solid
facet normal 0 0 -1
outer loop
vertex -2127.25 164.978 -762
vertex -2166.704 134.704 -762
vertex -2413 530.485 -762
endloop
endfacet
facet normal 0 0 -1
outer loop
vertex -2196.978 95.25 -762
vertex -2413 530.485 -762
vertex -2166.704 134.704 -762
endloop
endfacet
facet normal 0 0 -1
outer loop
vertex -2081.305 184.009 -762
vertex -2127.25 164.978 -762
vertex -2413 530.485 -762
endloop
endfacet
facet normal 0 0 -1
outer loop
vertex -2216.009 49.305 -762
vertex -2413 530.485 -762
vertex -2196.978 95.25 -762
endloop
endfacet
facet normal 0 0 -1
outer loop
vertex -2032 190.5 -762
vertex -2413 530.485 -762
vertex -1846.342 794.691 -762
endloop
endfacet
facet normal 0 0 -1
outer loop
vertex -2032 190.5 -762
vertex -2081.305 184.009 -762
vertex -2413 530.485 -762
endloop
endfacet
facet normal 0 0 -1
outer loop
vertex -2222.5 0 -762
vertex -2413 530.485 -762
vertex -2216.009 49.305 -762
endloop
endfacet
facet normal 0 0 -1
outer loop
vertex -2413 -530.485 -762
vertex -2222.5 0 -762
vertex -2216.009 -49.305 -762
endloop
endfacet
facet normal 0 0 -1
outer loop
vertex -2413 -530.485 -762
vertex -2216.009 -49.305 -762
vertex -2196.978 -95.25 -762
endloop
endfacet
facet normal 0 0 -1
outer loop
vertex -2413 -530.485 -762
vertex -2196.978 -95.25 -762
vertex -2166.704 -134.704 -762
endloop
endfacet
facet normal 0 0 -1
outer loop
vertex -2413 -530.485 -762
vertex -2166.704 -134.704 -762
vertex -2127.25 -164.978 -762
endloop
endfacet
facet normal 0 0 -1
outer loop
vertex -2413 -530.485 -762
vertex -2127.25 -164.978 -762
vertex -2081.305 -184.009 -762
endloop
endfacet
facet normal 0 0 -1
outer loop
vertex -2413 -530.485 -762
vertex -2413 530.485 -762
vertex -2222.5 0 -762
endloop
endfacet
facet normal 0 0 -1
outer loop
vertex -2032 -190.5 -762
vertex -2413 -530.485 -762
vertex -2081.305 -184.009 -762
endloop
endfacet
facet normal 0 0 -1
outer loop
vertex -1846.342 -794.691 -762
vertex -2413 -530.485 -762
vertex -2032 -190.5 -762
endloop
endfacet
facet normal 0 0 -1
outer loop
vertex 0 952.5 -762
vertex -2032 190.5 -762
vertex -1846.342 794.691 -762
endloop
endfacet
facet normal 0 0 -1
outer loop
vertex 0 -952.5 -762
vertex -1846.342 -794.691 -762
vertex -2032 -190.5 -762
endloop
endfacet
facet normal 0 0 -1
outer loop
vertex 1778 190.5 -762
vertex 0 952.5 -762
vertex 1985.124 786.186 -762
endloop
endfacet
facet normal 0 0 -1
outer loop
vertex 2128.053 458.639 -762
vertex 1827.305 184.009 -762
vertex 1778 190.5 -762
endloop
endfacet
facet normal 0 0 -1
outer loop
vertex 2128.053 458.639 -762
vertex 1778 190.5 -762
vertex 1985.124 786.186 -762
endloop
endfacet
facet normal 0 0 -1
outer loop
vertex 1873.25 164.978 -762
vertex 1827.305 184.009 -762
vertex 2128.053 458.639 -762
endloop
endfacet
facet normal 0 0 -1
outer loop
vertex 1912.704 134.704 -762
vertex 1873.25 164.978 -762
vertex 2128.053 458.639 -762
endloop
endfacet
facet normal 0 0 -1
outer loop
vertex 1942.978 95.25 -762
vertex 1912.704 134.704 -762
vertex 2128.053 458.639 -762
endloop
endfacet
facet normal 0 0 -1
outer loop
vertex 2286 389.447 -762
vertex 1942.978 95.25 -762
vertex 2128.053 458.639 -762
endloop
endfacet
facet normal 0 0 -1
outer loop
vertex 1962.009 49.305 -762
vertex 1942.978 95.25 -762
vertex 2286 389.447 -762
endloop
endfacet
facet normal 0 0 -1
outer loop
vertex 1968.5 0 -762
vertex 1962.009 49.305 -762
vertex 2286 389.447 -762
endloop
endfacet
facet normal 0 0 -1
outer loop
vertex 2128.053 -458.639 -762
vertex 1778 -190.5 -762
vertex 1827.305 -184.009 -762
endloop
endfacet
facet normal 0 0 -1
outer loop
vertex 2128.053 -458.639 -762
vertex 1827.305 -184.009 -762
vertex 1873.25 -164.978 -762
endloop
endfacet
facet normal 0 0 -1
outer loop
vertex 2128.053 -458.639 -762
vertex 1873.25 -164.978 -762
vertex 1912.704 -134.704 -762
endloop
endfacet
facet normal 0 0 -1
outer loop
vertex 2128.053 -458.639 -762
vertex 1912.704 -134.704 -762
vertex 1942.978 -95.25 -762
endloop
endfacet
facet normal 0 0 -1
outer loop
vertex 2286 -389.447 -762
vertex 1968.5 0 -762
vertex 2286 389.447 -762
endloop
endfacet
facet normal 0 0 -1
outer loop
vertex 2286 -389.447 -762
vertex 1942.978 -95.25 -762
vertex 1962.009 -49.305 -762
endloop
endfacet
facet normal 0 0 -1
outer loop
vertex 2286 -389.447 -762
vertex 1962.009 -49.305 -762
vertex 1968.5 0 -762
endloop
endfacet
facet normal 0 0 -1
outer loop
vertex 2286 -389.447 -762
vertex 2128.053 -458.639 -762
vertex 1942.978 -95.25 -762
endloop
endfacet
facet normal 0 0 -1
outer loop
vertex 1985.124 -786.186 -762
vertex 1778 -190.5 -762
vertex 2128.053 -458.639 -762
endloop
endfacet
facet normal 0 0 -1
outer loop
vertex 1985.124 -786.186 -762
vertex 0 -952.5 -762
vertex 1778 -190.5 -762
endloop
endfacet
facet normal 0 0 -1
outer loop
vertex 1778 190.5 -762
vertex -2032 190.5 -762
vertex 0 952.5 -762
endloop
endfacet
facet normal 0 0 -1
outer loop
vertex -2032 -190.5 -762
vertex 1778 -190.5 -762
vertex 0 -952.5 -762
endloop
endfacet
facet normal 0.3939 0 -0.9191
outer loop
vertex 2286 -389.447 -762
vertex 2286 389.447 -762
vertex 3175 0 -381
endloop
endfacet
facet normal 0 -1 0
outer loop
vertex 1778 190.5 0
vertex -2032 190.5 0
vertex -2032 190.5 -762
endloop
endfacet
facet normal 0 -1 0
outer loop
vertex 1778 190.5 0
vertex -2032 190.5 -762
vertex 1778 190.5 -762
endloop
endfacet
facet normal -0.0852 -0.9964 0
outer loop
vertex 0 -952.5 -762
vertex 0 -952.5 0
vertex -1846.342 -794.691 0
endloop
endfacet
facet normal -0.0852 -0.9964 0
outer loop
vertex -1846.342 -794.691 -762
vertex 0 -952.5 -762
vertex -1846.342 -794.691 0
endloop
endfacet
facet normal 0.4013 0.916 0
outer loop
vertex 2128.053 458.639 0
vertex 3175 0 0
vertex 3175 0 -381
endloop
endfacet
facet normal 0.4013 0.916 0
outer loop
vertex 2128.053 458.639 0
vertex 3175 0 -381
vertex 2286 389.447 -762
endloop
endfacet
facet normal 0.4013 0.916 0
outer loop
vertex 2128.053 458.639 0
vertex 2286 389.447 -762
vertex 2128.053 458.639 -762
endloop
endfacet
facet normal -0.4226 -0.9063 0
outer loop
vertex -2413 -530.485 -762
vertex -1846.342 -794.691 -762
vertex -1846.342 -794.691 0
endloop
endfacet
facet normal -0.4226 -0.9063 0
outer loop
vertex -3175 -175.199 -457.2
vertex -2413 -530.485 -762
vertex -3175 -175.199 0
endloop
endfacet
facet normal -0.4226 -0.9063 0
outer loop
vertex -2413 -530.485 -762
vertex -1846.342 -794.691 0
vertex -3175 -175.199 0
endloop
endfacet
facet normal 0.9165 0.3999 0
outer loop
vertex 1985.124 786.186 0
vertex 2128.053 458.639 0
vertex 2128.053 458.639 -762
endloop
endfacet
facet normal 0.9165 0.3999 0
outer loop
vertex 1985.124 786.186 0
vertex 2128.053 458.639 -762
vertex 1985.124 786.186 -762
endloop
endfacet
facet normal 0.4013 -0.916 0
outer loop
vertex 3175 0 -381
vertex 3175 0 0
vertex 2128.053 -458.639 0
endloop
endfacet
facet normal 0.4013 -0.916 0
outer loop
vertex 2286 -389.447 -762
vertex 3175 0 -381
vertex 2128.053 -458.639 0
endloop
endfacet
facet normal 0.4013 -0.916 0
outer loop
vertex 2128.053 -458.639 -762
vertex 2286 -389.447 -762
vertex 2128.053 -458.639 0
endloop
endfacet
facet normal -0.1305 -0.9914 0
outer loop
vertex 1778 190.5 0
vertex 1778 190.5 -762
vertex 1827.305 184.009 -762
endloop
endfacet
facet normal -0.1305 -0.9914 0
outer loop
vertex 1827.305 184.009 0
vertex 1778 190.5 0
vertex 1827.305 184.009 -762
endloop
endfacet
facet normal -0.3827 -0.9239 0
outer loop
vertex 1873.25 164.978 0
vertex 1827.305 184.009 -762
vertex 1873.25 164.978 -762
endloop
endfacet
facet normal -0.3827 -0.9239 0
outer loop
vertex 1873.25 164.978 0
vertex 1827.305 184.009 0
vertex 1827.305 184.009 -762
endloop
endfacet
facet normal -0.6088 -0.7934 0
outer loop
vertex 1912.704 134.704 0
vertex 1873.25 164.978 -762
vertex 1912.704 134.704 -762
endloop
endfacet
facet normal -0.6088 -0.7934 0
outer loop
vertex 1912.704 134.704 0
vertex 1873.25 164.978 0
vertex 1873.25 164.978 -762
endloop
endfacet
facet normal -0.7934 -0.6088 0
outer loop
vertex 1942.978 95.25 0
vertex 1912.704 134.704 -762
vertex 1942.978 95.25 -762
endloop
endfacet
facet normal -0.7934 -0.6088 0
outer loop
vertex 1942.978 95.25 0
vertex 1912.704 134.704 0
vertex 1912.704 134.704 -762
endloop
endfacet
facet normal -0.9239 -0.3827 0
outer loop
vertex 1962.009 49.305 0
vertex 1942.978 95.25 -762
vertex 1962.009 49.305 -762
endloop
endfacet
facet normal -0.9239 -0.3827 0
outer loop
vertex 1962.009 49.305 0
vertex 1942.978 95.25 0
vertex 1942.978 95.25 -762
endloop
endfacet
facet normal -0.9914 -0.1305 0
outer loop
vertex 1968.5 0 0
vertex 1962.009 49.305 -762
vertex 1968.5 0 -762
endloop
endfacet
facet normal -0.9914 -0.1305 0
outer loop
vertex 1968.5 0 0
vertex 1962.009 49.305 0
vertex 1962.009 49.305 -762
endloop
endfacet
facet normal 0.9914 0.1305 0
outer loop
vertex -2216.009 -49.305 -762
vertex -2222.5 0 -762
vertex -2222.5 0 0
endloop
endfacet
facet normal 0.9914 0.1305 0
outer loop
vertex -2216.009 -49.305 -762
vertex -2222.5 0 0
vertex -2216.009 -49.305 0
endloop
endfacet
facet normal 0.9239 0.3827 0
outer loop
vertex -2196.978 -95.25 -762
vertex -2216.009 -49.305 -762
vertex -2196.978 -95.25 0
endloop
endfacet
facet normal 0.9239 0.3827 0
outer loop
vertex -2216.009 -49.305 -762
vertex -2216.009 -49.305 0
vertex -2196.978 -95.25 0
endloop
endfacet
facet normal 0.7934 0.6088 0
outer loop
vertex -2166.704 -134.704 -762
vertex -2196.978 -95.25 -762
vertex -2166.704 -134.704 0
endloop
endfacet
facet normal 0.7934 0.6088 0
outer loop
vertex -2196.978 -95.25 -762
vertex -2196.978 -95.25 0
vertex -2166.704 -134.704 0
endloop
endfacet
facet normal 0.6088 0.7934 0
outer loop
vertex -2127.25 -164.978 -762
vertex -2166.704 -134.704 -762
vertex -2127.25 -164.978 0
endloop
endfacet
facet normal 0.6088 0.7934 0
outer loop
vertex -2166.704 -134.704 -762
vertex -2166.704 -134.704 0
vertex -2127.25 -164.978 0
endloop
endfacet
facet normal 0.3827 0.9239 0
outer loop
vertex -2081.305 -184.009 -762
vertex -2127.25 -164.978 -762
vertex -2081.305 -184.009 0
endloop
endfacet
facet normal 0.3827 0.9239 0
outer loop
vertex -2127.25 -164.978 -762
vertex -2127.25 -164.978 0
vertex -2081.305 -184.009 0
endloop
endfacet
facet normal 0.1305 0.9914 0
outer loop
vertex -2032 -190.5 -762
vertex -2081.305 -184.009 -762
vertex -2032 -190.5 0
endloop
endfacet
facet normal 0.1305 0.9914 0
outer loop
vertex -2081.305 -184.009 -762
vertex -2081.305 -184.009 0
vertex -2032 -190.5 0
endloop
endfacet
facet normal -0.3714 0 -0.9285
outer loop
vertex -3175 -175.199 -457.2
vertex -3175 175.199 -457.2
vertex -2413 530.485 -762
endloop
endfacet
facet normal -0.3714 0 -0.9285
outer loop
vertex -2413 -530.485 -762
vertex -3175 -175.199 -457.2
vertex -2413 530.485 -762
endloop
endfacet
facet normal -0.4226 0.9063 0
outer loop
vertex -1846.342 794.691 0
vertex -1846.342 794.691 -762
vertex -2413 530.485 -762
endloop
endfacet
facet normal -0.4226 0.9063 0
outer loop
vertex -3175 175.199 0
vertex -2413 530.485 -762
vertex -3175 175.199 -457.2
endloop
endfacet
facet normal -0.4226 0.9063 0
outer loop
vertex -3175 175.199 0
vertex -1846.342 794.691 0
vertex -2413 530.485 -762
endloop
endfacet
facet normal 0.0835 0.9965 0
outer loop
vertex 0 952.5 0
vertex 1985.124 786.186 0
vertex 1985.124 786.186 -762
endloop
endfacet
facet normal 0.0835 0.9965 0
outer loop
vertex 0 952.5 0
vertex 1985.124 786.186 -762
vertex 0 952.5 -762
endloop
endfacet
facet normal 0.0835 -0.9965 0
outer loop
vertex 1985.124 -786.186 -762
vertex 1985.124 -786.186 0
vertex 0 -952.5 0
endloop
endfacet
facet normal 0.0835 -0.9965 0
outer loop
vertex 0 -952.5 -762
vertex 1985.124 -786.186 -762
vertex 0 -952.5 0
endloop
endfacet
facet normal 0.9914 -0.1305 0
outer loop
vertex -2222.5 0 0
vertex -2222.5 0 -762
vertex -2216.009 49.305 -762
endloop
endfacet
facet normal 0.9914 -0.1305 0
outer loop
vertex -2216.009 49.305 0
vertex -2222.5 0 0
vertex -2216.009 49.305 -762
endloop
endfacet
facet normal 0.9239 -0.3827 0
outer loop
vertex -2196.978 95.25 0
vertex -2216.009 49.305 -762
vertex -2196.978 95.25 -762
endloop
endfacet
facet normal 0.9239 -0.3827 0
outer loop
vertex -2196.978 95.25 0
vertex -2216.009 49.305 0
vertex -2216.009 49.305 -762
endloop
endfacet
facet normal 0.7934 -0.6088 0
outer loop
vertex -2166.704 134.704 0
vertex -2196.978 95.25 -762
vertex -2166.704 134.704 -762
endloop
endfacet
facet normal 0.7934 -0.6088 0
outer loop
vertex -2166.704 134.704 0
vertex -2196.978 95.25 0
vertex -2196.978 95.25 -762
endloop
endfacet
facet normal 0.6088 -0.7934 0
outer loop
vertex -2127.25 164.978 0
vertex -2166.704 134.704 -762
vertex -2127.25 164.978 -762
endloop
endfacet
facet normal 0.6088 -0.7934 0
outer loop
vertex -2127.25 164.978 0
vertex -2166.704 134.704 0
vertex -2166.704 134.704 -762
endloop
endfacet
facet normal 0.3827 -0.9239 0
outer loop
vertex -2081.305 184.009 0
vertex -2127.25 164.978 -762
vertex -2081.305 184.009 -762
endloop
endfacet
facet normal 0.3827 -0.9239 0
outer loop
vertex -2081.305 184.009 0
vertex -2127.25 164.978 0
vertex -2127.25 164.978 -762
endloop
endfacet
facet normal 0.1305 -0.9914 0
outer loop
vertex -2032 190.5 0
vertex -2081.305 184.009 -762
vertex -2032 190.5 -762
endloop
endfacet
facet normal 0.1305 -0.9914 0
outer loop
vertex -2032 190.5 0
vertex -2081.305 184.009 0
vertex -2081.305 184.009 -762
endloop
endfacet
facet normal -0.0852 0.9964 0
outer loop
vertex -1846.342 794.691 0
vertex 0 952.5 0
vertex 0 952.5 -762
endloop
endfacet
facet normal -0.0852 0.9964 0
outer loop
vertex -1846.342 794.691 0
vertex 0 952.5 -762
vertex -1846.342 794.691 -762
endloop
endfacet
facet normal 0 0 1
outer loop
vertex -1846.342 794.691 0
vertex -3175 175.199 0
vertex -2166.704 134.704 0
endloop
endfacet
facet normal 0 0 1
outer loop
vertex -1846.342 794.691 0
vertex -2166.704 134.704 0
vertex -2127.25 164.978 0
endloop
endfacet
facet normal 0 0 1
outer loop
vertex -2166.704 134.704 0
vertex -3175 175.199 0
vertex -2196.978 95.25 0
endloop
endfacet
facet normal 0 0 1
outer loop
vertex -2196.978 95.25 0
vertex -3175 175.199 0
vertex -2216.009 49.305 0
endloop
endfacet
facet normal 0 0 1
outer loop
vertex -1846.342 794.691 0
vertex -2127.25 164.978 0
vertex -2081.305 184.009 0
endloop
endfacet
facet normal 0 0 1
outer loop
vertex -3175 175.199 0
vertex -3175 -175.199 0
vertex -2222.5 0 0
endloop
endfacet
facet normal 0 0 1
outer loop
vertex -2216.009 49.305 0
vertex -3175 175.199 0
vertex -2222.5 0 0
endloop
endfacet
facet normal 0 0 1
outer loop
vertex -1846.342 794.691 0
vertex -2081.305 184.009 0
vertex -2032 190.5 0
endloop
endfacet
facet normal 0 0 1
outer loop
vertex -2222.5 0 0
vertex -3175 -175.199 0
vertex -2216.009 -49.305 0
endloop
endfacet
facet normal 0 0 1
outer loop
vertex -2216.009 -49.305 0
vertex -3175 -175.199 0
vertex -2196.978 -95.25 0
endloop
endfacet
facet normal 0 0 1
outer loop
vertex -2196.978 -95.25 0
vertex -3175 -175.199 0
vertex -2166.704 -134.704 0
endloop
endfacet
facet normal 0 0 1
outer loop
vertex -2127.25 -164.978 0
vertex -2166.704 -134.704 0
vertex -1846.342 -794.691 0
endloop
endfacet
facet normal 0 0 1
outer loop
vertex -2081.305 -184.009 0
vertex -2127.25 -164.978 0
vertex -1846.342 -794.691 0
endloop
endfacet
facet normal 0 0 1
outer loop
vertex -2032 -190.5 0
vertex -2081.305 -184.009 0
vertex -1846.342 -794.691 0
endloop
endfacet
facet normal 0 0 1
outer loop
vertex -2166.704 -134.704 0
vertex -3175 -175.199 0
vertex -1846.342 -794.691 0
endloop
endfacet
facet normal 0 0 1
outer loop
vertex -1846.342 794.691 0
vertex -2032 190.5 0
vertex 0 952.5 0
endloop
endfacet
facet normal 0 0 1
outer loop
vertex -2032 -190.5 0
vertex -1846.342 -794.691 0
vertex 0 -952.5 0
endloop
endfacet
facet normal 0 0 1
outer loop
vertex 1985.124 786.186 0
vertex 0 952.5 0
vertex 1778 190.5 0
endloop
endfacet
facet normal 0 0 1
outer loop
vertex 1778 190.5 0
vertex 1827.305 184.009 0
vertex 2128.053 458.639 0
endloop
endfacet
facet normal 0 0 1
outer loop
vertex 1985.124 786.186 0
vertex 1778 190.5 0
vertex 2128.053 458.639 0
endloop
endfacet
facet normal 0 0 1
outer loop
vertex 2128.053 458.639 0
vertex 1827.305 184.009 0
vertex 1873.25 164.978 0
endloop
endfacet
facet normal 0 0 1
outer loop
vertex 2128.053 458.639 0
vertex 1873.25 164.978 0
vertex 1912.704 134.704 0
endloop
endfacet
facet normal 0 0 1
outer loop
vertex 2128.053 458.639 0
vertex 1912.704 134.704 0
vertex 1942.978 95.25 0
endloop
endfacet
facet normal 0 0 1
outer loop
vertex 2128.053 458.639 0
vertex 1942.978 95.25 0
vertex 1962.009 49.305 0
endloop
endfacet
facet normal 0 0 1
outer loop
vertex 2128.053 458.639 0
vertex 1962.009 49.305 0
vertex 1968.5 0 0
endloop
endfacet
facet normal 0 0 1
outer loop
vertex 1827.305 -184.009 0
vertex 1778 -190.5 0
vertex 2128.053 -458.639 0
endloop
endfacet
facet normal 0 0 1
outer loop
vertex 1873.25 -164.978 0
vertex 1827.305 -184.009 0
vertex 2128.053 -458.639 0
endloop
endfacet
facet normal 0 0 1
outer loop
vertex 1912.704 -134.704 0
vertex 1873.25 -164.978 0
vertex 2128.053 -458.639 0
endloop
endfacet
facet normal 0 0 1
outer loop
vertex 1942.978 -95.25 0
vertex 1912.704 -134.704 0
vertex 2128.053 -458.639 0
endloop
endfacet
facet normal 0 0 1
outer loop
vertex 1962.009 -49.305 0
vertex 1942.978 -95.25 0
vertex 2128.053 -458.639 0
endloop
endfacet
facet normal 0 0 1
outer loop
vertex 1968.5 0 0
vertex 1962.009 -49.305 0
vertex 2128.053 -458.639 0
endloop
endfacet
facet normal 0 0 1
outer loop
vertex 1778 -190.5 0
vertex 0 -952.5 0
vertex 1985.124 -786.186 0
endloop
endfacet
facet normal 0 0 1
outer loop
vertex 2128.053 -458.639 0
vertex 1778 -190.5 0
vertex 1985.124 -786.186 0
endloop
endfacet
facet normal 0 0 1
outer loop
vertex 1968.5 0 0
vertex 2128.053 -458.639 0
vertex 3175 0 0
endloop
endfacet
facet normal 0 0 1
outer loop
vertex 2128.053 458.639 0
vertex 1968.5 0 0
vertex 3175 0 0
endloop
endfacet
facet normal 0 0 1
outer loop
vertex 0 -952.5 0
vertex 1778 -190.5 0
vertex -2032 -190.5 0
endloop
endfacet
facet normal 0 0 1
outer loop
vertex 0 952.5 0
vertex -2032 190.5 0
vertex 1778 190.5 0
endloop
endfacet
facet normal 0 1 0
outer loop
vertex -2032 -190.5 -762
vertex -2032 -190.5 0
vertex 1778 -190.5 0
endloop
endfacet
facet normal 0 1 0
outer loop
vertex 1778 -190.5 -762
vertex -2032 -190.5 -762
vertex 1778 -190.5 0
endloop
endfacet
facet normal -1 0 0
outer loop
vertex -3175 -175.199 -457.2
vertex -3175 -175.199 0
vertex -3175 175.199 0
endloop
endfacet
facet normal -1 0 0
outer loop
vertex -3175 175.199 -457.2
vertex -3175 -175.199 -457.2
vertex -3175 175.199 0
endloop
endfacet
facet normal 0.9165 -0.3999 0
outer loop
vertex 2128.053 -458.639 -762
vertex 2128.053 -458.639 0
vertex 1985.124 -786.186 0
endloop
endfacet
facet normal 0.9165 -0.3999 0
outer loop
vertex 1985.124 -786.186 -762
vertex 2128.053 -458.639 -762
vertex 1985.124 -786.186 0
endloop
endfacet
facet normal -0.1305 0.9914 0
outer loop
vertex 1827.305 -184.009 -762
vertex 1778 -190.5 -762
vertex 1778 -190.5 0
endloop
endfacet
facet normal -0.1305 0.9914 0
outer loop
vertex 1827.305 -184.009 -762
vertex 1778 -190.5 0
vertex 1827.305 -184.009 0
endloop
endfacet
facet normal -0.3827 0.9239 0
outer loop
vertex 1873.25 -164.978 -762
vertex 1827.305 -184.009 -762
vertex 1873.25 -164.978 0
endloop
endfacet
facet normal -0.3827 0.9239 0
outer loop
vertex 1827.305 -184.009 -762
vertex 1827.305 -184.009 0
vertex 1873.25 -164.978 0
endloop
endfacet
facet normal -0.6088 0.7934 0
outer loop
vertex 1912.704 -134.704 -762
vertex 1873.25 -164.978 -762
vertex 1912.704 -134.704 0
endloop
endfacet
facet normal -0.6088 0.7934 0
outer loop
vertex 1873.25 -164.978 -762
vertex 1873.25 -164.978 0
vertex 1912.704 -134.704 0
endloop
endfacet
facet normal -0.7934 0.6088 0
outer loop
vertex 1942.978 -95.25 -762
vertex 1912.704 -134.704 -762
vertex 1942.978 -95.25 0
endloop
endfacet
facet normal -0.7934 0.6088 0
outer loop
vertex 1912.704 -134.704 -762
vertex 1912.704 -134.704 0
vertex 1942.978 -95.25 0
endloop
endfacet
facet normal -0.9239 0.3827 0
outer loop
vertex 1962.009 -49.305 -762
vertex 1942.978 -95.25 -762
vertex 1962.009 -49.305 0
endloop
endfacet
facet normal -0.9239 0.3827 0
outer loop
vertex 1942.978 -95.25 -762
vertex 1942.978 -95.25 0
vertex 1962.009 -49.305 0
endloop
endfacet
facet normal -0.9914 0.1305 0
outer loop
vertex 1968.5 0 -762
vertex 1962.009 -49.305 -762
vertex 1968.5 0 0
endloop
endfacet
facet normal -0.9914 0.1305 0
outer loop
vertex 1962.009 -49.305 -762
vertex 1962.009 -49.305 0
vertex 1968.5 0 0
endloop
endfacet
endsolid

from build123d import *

# Parameters (mm, degrees)
F1_DEPTH = 762
F3_DEPTH = 952.501


with BuildPart() as f1:
    # F0 (on Top) → F1 (new body)
    with BuildSketch(Plane.XY):
        with BuildLine():
            Line((1968.5, 0), (3175, 0))
            Line((3175, 0), (2128.052532, 458.63929))
            Line((2128.052532, 458.63929), (1985.123992, 786.185801))
            Line((1985.123992, 786.185801), (0, 952.5))
            Line((0, 952.5), (-1846.342444, 794.690728))
            Line((-1846.342444, 794.690728), (-3175, 175.199179))
            Line((-3175, 175.199179), (-3175, 0))
            Line((-3175, 0), (-2222.5, 0))
            ThreePointArc((-2222.5, 0), (-2166.703842, 134.703842), (-2032, 190.5))
            Line((-2032, 190.5), (1778, 190.5))
            ThreePointArc((1778, 190.5), (1912.703842, 134.703842), (1968.5, 0))
        make_face()
    extrude(amount=-F1_DEPTH)

    # F2 (on face) → F3 (intersect, through all)
    with BuildSketch(Plane.XZ):
        Polygon((2286, -762), (3175, -381), (3175, 0), (-3175, 0), (-3175, -457.2), (-2413, -762), align=None)
    extrude(amount=-F3_DEPTH, mode=Mode.INTERSECT)

    # F4: F1 across face


with BuildPart() as f1_1:
    add(f1.part)
    add(f1.part.mirror(Plane(origin=(-2656.416667, 0, -327.780952), x_dir=(1, 0, 0), z_dir=(0, -1, 0))))


solid = f1_1.part
